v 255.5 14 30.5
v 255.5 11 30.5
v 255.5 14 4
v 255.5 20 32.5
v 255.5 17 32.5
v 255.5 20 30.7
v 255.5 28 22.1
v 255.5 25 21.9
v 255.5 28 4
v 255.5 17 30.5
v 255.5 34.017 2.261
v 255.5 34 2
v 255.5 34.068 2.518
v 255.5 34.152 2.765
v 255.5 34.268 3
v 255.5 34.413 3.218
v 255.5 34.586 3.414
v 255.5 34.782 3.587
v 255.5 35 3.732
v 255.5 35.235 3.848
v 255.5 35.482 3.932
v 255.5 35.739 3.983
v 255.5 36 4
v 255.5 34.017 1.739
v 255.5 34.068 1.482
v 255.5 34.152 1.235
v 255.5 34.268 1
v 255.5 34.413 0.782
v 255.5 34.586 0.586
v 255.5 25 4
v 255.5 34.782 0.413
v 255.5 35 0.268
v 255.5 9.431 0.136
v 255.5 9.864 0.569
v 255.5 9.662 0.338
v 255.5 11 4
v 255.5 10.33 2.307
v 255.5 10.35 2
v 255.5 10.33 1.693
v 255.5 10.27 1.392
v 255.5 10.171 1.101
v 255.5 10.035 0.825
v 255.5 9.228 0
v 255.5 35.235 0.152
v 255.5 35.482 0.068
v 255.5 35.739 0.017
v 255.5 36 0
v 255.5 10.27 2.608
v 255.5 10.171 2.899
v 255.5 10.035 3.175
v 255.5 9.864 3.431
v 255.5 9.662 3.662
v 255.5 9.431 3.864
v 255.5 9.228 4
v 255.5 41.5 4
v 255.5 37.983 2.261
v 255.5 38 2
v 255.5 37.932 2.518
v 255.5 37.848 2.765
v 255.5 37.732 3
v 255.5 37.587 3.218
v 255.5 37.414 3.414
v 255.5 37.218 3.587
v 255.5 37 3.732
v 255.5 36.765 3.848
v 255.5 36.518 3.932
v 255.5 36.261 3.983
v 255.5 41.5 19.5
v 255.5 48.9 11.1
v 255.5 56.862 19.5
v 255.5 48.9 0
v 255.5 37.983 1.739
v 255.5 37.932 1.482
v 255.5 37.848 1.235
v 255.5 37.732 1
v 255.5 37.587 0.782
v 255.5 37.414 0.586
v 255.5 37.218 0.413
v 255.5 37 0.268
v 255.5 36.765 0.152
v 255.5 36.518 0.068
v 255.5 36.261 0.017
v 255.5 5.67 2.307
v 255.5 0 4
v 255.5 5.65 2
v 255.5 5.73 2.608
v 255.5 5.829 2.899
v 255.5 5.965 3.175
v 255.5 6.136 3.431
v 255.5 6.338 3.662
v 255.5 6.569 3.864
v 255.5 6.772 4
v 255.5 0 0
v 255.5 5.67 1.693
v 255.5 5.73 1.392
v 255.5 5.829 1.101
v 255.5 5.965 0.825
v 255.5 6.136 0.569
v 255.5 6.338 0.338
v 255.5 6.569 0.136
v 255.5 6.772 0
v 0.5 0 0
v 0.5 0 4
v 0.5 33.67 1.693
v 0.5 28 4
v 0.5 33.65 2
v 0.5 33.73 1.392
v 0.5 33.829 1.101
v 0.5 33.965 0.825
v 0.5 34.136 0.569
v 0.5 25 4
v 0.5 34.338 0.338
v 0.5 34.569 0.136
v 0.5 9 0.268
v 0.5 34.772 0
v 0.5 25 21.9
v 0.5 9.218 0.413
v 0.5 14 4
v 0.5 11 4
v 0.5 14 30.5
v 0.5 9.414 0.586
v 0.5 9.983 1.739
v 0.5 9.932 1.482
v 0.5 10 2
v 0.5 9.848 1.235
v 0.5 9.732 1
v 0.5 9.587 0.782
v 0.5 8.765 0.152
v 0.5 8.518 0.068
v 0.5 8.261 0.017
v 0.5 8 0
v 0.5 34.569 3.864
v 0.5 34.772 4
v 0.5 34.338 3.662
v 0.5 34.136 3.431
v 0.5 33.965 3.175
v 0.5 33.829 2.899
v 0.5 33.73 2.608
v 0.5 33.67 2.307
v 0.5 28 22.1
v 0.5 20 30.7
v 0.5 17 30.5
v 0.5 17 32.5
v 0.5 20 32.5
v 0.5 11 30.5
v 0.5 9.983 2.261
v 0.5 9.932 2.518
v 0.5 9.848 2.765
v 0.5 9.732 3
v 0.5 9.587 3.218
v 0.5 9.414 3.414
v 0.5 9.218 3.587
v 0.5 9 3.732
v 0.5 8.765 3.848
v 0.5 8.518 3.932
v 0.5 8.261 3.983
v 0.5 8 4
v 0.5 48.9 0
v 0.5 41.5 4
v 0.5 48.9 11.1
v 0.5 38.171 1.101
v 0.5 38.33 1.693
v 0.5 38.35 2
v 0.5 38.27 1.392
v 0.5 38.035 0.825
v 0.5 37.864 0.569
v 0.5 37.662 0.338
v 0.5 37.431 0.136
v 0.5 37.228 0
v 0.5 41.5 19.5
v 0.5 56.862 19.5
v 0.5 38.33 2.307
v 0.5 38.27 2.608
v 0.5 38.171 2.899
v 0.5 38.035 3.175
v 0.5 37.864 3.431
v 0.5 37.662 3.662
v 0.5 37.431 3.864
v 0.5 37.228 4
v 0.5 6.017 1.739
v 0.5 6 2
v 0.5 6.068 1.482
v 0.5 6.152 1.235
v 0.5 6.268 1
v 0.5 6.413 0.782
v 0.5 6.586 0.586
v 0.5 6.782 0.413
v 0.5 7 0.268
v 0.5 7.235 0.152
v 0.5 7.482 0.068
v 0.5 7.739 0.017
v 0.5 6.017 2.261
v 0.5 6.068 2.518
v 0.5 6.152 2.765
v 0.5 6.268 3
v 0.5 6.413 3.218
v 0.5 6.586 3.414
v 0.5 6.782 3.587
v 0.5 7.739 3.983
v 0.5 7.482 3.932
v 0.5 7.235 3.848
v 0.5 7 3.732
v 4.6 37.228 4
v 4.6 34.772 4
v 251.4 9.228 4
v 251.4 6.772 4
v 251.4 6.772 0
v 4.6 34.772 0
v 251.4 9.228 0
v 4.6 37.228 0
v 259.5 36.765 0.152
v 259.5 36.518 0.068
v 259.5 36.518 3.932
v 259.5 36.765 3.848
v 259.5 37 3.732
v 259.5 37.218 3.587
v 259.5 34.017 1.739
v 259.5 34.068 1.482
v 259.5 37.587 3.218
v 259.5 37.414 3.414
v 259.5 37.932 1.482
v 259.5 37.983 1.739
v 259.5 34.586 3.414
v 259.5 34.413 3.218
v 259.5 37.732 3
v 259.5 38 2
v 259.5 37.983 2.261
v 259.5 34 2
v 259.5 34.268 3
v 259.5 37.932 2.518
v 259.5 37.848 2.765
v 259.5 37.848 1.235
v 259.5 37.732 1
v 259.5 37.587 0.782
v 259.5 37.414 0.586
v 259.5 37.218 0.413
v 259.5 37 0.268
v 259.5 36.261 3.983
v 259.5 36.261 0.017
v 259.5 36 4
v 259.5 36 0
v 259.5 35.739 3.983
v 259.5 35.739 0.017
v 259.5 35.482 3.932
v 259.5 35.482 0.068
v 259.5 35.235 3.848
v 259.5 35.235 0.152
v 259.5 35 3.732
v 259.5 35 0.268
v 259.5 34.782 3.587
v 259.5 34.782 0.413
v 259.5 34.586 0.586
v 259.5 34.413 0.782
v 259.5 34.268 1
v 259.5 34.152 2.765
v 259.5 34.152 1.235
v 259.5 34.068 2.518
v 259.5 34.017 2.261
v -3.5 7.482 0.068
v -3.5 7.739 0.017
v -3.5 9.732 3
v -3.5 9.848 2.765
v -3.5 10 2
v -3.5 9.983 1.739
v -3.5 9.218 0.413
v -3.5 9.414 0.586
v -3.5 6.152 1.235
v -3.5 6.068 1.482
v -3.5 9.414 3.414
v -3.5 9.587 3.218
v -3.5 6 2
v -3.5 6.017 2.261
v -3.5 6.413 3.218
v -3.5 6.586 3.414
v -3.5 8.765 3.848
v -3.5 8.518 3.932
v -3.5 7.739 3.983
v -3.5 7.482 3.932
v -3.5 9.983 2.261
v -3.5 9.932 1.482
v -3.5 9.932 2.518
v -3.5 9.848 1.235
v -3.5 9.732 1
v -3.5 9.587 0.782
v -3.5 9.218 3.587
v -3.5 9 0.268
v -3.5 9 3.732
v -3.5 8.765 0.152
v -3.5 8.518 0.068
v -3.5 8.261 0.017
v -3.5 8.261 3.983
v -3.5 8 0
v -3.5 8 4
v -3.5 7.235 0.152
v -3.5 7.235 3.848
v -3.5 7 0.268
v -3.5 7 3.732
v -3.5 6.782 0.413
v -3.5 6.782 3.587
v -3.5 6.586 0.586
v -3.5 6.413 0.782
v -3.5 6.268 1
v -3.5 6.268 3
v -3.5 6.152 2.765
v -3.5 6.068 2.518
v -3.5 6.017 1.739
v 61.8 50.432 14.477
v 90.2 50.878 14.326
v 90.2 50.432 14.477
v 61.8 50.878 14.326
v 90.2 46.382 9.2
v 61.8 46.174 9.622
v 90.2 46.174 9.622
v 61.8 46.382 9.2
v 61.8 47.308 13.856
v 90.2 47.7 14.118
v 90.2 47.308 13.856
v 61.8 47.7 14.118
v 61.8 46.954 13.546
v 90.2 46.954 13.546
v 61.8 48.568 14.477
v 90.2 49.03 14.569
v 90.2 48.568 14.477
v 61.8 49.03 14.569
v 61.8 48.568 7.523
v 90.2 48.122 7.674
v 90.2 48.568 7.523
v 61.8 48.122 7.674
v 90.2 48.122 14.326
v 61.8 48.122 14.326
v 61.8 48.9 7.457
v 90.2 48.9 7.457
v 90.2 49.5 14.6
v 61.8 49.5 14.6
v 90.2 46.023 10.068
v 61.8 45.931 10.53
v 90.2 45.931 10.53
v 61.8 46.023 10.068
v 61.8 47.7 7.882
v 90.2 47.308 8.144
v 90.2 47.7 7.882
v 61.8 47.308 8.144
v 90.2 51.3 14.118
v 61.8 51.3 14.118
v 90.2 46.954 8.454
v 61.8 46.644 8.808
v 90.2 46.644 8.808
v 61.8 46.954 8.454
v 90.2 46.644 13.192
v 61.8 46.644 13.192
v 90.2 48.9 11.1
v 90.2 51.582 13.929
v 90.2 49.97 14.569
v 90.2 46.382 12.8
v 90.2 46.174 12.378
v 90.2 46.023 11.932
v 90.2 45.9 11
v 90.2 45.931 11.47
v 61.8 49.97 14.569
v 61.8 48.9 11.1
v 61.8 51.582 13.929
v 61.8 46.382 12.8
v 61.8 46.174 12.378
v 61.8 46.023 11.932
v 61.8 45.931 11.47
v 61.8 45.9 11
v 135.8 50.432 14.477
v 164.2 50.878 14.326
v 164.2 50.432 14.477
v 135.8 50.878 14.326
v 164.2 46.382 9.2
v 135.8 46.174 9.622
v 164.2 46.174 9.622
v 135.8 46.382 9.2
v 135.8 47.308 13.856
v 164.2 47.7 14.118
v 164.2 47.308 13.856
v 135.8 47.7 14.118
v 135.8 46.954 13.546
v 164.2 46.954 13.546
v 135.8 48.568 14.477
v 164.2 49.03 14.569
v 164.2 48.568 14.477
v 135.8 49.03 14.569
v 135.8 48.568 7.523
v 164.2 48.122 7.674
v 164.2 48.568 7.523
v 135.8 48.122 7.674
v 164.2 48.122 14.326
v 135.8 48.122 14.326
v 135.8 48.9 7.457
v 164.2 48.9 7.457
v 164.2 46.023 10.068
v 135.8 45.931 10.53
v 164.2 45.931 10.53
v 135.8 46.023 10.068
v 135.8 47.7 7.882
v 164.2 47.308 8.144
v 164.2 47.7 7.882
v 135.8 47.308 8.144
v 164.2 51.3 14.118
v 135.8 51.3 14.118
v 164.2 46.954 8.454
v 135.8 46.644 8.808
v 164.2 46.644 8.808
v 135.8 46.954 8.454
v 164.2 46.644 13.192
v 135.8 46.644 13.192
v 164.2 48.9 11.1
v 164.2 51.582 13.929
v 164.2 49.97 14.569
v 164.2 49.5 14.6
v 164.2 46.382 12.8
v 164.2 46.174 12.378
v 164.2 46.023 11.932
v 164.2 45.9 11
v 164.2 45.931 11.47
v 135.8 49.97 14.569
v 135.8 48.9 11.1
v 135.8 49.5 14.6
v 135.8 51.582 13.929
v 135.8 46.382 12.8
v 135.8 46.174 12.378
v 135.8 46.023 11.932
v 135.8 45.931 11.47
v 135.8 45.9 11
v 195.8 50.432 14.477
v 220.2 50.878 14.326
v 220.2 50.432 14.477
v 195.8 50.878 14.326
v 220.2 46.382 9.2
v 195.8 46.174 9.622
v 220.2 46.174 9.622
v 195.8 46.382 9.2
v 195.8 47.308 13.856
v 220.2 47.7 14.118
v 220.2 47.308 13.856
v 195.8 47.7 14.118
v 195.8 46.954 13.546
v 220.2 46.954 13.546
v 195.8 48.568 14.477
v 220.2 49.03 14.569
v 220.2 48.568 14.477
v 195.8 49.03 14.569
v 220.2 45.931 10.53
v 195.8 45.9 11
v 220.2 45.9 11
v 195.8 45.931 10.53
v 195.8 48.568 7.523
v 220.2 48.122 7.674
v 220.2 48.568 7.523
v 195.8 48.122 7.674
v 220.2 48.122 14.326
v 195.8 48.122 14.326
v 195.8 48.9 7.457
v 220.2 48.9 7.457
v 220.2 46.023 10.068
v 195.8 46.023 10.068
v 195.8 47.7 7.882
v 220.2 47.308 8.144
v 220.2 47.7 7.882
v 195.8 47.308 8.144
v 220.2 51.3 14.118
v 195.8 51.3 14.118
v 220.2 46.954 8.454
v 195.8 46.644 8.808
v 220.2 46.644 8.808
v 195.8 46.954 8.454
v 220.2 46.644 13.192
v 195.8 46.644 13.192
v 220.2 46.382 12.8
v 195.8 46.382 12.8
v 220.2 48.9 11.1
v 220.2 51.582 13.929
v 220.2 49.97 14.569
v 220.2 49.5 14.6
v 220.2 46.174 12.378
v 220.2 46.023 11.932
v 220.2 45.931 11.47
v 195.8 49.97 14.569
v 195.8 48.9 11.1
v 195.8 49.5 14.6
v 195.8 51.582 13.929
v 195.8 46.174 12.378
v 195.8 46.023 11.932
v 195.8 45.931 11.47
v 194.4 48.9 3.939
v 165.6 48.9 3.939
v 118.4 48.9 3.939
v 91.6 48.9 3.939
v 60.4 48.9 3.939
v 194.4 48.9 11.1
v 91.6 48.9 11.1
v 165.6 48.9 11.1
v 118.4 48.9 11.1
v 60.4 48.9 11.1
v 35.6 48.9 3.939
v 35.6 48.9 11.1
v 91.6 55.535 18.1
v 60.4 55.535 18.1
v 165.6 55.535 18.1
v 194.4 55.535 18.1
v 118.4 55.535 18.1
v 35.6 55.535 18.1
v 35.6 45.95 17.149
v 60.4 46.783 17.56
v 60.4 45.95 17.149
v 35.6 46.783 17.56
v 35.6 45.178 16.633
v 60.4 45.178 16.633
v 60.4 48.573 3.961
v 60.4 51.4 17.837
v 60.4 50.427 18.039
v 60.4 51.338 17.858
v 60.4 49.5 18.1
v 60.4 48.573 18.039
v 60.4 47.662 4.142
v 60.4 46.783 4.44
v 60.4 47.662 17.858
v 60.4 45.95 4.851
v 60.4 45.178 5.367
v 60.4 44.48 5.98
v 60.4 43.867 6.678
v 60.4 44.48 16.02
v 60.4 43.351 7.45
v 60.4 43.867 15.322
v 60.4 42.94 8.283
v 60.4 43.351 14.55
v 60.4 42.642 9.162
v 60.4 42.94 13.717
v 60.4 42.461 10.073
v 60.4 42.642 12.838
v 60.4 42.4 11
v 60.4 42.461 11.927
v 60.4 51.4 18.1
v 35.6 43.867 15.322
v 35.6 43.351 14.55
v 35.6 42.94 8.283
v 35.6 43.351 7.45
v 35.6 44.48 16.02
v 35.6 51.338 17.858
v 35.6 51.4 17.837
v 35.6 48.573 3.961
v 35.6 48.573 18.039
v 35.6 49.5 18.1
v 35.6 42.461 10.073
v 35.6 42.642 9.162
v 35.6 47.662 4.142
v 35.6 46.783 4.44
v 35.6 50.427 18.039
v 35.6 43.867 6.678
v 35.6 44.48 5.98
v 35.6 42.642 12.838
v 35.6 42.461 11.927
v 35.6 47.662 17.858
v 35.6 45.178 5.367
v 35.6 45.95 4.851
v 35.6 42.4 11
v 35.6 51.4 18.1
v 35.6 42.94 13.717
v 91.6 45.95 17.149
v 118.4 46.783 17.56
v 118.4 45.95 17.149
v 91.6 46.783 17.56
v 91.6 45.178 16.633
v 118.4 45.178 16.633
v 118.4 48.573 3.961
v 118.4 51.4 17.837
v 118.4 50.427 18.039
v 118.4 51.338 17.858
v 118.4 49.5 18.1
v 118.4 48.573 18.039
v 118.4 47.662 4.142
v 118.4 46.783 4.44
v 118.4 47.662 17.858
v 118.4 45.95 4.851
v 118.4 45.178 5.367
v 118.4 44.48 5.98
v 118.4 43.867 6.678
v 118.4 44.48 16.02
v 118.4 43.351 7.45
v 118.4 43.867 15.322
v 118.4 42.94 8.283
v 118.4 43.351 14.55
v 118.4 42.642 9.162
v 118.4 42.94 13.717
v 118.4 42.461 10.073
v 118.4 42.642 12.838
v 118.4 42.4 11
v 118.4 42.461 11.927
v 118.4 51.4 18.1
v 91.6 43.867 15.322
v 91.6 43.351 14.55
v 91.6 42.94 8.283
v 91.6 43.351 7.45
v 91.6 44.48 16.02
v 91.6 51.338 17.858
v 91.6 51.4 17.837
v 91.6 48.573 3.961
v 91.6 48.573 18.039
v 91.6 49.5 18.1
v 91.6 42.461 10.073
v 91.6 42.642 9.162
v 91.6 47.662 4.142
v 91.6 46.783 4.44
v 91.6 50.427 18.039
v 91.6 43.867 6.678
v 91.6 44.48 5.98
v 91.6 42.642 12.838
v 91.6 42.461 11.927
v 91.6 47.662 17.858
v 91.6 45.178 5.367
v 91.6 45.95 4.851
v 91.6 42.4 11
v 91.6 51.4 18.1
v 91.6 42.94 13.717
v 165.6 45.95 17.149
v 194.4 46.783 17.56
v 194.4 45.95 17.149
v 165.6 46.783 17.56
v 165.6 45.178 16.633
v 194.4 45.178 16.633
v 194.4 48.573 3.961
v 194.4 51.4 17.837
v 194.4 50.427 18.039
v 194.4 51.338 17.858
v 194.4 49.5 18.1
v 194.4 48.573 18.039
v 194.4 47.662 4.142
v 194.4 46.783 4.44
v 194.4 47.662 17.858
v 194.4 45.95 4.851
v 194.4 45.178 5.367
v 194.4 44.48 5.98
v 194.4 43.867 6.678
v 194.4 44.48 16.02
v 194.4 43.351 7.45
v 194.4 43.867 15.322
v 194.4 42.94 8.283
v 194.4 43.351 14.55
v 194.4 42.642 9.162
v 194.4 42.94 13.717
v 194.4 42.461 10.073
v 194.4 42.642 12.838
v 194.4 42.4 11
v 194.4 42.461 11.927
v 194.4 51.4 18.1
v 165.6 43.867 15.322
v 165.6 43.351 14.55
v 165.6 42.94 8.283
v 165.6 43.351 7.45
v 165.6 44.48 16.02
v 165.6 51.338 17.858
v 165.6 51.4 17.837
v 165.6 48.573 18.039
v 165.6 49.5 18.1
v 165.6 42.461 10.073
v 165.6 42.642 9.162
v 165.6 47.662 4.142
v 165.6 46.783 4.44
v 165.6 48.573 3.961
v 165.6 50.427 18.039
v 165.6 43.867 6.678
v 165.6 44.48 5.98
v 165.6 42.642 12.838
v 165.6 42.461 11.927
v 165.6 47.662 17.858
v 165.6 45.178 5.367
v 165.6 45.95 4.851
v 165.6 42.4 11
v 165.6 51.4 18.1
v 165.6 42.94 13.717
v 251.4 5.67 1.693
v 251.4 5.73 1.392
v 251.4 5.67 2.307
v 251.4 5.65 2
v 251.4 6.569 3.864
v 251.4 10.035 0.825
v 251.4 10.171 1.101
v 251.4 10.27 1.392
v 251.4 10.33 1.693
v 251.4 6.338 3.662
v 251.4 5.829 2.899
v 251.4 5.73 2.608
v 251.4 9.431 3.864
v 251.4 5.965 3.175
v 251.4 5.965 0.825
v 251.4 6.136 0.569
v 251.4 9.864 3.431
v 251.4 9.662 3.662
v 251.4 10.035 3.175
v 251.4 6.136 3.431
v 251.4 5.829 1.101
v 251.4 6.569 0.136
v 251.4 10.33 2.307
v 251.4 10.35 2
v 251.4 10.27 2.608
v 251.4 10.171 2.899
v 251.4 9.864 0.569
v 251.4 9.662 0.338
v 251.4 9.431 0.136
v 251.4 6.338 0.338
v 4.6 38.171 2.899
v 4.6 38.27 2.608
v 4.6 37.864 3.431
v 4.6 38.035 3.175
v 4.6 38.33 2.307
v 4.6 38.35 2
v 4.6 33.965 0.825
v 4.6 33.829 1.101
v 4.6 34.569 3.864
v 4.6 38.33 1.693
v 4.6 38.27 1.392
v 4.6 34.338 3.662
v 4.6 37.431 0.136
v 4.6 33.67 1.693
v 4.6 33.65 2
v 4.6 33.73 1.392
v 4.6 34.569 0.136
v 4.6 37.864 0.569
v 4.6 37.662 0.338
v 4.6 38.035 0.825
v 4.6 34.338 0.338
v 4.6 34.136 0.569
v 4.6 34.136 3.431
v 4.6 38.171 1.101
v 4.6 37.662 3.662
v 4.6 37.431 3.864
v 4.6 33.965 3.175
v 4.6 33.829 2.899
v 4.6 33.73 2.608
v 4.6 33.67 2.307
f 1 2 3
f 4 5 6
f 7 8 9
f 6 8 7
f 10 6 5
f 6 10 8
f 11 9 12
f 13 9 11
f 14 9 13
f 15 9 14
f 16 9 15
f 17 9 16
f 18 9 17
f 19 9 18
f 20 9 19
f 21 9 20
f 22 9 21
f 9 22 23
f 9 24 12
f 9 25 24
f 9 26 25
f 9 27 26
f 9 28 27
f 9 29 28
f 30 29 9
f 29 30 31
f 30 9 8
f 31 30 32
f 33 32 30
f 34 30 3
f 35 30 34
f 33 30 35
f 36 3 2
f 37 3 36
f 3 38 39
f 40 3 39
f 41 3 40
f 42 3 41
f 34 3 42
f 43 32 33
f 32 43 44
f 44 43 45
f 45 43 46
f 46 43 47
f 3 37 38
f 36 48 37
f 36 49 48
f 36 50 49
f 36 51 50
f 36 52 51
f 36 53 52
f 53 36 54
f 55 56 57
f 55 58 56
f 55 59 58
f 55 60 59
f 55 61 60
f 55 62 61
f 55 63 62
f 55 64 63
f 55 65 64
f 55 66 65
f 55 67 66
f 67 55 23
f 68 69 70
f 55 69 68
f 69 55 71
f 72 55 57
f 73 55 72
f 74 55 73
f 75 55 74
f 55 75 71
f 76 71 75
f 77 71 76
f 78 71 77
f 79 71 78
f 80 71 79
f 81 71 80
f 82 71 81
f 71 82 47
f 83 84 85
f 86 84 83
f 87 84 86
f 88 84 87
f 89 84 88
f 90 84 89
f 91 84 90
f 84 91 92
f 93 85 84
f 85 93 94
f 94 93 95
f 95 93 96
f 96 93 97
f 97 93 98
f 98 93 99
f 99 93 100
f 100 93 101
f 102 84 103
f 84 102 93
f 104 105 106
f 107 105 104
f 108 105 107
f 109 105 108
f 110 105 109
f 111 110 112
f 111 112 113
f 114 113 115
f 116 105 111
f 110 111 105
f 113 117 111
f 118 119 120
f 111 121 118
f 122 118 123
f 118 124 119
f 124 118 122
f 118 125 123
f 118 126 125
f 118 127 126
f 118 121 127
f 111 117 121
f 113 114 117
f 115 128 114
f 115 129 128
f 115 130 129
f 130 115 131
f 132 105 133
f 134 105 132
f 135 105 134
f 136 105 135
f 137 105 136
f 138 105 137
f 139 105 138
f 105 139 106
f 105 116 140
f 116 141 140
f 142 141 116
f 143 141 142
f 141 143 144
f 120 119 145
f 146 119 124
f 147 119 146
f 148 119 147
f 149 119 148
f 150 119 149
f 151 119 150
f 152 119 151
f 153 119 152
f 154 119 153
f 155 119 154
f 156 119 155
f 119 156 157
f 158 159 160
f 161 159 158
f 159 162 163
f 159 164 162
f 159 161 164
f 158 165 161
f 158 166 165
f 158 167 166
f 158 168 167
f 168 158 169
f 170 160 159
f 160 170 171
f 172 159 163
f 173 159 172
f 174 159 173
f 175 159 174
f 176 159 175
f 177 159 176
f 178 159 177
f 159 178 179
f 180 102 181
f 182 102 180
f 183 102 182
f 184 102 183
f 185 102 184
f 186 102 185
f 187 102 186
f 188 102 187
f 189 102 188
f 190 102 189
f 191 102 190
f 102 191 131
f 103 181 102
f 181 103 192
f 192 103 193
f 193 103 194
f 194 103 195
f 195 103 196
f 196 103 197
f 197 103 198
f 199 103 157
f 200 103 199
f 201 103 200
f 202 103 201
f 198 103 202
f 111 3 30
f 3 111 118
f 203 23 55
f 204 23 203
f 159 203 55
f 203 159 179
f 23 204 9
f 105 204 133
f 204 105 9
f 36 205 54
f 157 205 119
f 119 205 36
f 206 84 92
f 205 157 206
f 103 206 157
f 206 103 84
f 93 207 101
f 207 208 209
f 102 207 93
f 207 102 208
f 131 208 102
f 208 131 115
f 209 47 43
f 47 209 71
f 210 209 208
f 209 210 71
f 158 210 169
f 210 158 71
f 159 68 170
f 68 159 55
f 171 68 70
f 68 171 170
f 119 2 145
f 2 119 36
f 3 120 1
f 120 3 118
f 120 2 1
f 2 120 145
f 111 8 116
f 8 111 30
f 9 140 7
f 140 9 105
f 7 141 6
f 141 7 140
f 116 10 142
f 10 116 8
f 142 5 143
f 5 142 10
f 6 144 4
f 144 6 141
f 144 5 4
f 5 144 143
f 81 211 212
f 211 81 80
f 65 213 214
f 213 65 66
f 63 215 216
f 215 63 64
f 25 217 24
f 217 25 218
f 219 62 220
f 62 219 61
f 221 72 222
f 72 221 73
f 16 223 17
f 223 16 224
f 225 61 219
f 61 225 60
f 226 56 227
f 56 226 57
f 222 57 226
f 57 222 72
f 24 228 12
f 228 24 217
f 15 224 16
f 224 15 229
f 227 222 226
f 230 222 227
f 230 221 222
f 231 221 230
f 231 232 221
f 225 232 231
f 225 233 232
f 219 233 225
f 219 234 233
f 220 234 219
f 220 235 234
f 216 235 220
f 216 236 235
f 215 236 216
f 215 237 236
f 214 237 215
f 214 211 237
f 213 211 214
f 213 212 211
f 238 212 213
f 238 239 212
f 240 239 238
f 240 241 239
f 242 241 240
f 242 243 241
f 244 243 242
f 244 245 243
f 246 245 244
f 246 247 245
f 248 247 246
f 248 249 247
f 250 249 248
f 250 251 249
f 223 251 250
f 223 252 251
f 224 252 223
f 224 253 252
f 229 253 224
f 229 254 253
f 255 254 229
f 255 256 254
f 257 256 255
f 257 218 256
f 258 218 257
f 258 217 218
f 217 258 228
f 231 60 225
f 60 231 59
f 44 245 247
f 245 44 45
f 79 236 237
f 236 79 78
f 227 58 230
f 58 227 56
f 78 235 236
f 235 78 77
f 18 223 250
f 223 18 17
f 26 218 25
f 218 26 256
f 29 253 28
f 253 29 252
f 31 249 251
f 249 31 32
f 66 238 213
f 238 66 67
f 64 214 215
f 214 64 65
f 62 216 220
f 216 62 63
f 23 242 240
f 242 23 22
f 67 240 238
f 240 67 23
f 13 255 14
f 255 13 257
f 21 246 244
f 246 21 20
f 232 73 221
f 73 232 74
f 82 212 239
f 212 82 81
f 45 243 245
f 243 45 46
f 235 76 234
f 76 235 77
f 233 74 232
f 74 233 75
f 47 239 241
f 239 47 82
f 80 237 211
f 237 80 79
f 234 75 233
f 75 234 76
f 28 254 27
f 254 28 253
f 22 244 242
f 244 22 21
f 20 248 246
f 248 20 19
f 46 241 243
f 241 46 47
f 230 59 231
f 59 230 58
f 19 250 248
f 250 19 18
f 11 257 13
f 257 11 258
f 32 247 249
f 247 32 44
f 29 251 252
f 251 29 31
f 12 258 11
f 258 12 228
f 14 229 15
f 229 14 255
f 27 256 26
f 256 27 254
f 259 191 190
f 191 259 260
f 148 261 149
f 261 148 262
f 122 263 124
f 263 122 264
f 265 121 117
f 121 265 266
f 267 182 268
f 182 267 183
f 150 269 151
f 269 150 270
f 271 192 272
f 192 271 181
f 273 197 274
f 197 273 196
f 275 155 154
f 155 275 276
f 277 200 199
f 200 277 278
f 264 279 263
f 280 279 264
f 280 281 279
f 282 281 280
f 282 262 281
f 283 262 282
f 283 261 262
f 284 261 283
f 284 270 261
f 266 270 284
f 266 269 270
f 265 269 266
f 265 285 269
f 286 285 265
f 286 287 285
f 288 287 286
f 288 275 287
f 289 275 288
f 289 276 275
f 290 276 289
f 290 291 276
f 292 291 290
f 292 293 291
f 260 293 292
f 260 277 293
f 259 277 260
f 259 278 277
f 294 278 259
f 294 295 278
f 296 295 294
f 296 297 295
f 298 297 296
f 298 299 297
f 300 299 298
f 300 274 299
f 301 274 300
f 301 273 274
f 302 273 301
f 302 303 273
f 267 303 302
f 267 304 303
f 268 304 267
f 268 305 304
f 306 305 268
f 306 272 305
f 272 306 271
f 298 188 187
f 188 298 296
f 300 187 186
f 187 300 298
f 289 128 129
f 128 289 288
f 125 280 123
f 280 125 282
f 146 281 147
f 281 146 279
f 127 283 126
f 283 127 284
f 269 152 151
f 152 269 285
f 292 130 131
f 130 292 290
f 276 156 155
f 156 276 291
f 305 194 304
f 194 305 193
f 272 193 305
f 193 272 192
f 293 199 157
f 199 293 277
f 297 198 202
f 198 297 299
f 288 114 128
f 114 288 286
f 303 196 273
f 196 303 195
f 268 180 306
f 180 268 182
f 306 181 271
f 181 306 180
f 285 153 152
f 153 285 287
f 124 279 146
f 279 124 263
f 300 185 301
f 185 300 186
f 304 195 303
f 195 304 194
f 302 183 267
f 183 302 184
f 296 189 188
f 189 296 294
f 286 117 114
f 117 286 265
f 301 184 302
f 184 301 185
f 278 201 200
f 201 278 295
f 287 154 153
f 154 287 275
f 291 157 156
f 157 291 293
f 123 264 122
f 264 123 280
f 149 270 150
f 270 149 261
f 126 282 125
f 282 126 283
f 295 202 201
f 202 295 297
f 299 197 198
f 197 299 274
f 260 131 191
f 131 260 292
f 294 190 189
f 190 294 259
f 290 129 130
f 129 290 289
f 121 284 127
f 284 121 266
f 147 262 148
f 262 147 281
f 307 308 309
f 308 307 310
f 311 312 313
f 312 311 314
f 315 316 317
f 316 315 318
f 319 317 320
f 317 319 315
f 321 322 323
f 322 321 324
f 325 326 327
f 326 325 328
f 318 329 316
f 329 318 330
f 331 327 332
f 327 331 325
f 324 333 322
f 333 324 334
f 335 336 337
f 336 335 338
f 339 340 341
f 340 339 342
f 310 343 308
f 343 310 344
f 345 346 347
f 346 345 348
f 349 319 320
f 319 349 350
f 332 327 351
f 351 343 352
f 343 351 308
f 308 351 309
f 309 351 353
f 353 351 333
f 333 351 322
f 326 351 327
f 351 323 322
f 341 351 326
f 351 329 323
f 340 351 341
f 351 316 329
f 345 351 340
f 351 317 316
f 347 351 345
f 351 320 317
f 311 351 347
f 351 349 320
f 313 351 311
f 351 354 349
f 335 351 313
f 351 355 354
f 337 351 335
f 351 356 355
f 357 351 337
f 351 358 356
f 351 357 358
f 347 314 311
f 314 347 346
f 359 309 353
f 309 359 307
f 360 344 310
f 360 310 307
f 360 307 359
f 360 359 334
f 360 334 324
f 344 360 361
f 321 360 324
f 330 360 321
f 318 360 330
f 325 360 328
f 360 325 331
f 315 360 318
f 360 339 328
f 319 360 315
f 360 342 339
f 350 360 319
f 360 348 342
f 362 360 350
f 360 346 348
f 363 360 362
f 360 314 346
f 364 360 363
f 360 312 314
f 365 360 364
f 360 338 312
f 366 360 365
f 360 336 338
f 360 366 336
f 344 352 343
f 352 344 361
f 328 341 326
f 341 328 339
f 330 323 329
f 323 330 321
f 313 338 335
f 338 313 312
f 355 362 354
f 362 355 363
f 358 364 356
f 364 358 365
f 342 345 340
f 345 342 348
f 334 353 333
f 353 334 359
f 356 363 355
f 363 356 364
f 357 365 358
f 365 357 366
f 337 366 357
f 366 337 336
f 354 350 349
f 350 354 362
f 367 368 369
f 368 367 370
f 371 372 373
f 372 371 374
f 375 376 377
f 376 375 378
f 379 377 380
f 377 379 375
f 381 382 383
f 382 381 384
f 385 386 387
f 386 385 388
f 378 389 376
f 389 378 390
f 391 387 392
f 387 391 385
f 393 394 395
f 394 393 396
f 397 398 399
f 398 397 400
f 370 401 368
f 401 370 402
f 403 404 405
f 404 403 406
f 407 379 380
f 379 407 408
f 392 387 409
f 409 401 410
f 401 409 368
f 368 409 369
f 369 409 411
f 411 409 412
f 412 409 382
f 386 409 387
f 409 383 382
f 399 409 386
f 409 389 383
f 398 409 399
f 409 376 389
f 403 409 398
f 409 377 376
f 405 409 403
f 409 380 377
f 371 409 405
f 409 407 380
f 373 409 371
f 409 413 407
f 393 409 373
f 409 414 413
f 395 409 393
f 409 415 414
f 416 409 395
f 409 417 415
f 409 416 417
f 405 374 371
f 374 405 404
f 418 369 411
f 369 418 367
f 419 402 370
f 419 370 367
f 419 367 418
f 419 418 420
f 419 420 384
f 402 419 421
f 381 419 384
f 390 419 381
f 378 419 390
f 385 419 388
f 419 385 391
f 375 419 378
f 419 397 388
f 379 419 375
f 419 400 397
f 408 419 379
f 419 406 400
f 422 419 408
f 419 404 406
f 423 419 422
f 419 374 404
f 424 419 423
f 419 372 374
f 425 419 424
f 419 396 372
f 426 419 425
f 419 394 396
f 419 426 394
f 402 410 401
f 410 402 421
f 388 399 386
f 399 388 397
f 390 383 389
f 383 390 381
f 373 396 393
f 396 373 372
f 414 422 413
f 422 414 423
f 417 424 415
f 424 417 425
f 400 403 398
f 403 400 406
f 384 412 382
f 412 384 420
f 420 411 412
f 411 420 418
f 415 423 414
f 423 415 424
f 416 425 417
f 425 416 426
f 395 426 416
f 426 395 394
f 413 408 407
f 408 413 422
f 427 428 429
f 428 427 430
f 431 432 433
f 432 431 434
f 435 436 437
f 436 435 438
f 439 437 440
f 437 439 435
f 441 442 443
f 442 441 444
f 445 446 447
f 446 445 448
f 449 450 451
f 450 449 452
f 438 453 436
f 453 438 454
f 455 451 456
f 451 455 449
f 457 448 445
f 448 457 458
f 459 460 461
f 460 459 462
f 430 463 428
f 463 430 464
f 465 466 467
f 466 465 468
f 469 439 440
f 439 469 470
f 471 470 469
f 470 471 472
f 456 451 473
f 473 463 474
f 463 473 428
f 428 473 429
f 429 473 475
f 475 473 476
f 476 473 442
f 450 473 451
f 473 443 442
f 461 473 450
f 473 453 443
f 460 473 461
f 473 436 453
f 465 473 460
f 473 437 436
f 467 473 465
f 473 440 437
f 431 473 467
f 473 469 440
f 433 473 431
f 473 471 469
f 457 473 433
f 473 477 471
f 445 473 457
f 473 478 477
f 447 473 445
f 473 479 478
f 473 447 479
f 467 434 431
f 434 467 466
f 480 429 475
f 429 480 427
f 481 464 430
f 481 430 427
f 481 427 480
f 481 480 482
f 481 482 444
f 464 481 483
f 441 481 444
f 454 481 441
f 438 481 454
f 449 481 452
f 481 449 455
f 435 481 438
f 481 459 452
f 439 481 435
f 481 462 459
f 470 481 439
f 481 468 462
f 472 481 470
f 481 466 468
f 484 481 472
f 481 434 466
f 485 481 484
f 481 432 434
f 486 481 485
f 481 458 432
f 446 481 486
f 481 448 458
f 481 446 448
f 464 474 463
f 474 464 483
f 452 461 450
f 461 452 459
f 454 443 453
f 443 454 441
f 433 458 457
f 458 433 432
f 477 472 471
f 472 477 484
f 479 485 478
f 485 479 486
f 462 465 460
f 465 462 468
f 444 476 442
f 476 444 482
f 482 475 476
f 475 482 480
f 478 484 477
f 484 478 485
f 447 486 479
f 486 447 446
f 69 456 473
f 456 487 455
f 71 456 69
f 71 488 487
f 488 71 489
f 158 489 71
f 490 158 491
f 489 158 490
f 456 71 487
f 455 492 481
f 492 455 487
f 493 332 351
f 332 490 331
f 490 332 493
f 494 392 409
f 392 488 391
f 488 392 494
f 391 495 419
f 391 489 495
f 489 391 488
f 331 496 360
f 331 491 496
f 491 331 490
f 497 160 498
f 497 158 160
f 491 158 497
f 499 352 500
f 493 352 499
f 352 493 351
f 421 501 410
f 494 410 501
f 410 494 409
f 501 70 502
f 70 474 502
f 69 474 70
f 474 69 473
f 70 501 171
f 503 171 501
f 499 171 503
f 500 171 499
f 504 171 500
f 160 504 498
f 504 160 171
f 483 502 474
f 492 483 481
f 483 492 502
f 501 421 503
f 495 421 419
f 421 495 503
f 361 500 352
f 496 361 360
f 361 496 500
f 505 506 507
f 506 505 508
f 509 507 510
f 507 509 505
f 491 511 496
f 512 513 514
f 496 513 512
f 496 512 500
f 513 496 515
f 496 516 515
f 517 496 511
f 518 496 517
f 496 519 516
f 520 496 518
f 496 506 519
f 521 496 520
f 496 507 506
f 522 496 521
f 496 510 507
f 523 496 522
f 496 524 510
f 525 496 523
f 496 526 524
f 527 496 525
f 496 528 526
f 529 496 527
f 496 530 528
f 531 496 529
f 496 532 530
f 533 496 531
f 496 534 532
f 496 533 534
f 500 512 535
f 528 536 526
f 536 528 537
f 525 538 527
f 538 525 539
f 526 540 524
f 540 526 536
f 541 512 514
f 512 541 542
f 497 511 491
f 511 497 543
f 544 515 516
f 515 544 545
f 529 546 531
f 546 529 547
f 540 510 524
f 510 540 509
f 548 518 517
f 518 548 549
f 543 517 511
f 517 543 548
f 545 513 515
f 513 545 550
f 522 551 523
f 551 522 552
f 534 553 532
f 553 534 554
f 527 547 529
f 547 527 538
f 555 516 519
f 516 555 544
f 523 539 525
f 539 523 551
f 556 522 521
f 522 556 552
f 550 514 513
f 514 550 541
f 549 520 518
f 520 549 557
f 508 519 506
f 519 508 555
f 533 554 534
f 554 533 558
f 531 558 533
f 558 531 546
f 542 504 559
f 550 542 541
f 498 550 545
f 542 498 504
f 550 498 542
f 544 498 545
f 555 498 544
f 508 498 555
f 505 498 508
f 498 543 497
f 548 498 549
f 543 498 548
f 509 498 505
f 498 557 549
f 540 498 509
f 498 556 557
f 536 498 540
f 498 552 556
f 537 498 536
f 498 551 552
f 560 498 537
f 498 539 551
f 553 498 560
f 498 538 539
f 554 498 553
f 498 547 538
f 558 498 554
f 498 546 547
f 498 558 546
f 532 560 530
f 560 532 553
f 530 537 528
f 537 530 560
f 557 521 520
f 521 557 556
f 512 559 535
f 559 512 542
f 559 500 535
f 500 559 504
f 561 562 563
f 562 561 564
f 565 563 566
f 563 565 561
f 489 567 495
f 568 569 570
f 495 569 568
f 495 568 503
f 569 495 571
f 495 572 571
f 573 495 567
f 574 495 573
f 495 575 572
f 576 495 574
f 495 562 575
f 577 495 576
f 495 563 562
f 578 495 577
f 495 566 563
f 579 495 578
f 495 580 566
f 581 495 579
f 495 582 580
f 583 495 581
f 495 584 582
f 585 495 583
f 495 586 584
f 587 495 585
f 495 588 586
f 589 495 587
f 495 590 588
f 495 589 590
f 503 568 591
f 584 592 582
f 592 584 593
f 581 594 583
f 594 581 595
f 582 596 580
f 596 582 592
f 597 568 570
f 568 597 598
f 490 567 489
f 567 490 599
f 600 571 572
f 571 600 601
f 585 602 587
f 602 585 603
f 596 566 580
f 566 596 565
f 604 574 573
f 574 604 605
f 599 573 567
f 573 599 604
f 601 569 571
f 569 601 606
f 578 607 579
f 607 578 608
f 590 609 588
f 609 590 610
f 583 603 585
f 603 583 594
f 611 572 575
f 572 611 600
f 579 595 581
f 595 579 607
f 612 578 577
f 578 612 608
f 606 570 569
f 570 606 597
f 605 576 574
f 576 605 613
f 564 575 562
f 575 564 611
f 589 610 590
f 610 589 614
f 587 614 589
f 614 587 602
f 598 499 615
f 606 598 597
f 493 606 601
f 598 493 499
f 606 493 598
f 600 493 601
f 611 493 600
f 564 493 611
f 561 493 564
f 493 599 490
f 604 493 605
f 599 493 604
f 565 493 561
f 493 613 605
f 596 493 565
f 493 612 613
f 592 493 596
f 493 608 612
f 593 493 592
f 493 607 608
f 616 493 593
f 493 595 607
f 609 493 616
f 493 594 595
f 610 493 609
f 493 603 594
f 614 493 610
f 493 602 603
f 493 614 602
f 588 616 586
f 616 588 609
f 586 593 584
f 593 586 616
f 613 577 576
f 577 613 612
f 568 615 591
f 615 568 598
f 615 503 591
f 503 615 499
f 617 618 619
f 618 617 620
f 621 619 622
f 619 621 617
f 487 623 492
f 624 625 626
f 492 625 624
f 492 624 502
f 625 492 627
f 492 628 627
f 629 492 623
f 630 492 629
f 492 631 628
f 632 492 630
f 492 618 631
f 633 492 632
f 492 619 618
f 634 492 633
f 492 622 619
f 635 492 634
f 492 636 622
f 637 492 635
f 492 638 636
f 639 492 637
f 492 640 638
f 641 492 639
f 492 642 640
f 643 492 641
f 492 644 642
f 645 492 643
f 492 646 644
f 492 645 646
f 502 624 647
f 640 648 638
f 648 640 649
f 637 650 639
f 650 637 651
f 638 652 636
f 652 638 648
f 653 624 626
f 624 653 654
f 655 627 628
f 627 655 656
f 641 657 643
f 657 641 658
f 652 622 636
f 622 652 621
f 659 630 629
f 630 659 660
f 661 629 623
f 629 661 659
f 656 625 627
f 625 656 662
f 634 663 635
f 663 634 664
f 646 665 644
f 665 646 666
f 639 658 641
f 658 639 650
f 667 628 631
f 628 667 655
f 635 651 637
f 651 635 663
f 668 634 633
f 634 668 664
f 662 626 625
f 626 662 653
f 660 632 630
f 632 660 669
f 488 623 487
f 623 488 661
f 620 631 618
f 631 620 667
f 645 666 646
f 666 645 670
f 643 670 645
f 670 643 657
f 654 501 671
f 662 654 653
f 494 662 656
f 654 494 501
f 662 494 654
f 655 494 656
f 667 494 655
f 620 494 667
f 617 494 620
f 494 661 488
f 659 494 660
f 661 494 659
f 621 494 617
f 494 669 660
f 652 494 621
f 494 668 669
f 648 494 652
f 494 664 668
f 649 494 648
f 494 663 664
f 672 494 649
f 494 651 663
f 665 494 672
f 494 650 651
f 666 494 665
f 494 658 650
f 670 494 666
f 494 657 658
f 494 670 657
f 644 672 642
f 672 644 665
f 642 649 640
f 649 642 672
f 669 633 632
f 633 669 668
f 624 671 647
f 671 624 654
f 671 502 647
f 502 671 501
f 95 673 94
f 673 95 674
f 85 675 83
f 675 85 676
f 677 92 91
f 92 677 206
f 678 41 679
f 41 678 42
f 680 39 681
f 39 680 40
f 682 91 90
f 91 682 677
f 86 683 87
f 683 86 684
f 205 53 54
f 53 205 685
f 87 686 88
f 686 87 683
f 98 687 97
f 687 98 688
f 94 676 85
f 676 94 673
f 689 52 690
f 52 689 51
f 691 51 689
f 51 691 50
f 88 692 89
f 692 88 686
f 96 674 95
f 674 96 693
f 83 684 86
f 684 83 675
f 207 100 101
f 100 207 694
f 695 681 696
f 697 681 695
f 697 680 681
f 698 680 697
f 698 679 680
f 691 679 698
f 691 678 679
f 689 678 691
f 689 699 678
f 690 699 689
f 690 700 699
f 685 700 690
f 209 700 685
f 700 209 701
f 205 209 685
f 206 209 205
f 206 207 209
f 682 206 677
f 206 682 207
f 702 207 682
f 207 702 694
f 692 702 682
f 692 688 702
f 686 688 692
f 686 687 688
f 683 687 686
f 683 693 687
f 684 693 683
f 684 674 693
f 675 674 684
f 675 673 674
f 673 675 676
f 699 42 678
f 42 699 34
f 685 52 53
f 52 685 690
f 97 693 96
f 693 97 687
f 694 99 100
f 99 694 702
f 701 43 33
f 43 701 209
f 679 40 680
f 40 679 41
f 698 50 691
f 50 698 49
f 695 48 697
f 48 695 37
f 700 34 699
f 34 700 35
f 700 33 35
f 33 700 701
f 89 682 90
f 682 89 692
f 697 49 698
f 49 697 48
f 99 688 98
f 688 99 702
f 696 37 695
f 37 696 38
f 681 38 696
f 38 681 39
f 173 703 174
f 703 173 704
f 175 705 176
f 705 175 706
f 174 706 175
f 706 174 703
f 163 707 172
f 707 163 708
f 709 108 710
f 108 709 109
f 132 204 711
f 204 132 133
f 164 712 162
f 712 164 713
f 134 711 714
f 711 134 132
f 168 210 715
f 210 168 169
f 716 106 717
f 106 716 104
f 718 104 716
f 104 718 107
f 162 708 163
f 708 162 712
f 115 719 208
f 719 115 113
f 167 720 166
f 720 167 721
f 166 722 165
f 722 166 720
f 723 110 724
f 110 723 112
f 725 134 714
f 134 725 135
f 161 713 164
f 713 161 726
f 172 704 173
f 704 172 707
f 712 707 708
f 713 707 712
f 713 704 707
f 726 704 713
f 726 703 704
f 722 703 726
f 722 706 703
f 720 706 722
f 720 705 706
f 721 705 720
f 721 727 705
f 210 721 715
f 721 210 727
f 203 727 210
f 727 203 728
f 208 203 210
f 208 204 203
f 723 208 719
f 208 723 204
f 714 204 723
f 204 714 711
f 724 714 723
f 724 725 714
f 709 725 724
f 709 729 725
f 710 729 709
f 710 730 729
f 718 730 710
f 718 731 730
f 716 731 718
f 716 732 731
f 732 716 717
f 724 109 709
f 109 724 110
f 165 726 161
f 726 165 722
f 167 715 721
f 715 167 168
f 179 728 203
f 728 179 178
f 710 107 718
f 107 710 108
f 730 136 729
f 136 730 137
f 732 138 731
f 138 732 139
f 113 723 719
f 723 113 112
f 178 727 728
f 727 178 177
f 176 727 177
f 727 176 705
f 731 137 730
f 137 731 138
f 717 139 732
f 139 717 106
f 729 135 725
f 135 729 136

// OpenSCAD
hinge_part = "equipment_base";
include <hinge_version.scad>;
